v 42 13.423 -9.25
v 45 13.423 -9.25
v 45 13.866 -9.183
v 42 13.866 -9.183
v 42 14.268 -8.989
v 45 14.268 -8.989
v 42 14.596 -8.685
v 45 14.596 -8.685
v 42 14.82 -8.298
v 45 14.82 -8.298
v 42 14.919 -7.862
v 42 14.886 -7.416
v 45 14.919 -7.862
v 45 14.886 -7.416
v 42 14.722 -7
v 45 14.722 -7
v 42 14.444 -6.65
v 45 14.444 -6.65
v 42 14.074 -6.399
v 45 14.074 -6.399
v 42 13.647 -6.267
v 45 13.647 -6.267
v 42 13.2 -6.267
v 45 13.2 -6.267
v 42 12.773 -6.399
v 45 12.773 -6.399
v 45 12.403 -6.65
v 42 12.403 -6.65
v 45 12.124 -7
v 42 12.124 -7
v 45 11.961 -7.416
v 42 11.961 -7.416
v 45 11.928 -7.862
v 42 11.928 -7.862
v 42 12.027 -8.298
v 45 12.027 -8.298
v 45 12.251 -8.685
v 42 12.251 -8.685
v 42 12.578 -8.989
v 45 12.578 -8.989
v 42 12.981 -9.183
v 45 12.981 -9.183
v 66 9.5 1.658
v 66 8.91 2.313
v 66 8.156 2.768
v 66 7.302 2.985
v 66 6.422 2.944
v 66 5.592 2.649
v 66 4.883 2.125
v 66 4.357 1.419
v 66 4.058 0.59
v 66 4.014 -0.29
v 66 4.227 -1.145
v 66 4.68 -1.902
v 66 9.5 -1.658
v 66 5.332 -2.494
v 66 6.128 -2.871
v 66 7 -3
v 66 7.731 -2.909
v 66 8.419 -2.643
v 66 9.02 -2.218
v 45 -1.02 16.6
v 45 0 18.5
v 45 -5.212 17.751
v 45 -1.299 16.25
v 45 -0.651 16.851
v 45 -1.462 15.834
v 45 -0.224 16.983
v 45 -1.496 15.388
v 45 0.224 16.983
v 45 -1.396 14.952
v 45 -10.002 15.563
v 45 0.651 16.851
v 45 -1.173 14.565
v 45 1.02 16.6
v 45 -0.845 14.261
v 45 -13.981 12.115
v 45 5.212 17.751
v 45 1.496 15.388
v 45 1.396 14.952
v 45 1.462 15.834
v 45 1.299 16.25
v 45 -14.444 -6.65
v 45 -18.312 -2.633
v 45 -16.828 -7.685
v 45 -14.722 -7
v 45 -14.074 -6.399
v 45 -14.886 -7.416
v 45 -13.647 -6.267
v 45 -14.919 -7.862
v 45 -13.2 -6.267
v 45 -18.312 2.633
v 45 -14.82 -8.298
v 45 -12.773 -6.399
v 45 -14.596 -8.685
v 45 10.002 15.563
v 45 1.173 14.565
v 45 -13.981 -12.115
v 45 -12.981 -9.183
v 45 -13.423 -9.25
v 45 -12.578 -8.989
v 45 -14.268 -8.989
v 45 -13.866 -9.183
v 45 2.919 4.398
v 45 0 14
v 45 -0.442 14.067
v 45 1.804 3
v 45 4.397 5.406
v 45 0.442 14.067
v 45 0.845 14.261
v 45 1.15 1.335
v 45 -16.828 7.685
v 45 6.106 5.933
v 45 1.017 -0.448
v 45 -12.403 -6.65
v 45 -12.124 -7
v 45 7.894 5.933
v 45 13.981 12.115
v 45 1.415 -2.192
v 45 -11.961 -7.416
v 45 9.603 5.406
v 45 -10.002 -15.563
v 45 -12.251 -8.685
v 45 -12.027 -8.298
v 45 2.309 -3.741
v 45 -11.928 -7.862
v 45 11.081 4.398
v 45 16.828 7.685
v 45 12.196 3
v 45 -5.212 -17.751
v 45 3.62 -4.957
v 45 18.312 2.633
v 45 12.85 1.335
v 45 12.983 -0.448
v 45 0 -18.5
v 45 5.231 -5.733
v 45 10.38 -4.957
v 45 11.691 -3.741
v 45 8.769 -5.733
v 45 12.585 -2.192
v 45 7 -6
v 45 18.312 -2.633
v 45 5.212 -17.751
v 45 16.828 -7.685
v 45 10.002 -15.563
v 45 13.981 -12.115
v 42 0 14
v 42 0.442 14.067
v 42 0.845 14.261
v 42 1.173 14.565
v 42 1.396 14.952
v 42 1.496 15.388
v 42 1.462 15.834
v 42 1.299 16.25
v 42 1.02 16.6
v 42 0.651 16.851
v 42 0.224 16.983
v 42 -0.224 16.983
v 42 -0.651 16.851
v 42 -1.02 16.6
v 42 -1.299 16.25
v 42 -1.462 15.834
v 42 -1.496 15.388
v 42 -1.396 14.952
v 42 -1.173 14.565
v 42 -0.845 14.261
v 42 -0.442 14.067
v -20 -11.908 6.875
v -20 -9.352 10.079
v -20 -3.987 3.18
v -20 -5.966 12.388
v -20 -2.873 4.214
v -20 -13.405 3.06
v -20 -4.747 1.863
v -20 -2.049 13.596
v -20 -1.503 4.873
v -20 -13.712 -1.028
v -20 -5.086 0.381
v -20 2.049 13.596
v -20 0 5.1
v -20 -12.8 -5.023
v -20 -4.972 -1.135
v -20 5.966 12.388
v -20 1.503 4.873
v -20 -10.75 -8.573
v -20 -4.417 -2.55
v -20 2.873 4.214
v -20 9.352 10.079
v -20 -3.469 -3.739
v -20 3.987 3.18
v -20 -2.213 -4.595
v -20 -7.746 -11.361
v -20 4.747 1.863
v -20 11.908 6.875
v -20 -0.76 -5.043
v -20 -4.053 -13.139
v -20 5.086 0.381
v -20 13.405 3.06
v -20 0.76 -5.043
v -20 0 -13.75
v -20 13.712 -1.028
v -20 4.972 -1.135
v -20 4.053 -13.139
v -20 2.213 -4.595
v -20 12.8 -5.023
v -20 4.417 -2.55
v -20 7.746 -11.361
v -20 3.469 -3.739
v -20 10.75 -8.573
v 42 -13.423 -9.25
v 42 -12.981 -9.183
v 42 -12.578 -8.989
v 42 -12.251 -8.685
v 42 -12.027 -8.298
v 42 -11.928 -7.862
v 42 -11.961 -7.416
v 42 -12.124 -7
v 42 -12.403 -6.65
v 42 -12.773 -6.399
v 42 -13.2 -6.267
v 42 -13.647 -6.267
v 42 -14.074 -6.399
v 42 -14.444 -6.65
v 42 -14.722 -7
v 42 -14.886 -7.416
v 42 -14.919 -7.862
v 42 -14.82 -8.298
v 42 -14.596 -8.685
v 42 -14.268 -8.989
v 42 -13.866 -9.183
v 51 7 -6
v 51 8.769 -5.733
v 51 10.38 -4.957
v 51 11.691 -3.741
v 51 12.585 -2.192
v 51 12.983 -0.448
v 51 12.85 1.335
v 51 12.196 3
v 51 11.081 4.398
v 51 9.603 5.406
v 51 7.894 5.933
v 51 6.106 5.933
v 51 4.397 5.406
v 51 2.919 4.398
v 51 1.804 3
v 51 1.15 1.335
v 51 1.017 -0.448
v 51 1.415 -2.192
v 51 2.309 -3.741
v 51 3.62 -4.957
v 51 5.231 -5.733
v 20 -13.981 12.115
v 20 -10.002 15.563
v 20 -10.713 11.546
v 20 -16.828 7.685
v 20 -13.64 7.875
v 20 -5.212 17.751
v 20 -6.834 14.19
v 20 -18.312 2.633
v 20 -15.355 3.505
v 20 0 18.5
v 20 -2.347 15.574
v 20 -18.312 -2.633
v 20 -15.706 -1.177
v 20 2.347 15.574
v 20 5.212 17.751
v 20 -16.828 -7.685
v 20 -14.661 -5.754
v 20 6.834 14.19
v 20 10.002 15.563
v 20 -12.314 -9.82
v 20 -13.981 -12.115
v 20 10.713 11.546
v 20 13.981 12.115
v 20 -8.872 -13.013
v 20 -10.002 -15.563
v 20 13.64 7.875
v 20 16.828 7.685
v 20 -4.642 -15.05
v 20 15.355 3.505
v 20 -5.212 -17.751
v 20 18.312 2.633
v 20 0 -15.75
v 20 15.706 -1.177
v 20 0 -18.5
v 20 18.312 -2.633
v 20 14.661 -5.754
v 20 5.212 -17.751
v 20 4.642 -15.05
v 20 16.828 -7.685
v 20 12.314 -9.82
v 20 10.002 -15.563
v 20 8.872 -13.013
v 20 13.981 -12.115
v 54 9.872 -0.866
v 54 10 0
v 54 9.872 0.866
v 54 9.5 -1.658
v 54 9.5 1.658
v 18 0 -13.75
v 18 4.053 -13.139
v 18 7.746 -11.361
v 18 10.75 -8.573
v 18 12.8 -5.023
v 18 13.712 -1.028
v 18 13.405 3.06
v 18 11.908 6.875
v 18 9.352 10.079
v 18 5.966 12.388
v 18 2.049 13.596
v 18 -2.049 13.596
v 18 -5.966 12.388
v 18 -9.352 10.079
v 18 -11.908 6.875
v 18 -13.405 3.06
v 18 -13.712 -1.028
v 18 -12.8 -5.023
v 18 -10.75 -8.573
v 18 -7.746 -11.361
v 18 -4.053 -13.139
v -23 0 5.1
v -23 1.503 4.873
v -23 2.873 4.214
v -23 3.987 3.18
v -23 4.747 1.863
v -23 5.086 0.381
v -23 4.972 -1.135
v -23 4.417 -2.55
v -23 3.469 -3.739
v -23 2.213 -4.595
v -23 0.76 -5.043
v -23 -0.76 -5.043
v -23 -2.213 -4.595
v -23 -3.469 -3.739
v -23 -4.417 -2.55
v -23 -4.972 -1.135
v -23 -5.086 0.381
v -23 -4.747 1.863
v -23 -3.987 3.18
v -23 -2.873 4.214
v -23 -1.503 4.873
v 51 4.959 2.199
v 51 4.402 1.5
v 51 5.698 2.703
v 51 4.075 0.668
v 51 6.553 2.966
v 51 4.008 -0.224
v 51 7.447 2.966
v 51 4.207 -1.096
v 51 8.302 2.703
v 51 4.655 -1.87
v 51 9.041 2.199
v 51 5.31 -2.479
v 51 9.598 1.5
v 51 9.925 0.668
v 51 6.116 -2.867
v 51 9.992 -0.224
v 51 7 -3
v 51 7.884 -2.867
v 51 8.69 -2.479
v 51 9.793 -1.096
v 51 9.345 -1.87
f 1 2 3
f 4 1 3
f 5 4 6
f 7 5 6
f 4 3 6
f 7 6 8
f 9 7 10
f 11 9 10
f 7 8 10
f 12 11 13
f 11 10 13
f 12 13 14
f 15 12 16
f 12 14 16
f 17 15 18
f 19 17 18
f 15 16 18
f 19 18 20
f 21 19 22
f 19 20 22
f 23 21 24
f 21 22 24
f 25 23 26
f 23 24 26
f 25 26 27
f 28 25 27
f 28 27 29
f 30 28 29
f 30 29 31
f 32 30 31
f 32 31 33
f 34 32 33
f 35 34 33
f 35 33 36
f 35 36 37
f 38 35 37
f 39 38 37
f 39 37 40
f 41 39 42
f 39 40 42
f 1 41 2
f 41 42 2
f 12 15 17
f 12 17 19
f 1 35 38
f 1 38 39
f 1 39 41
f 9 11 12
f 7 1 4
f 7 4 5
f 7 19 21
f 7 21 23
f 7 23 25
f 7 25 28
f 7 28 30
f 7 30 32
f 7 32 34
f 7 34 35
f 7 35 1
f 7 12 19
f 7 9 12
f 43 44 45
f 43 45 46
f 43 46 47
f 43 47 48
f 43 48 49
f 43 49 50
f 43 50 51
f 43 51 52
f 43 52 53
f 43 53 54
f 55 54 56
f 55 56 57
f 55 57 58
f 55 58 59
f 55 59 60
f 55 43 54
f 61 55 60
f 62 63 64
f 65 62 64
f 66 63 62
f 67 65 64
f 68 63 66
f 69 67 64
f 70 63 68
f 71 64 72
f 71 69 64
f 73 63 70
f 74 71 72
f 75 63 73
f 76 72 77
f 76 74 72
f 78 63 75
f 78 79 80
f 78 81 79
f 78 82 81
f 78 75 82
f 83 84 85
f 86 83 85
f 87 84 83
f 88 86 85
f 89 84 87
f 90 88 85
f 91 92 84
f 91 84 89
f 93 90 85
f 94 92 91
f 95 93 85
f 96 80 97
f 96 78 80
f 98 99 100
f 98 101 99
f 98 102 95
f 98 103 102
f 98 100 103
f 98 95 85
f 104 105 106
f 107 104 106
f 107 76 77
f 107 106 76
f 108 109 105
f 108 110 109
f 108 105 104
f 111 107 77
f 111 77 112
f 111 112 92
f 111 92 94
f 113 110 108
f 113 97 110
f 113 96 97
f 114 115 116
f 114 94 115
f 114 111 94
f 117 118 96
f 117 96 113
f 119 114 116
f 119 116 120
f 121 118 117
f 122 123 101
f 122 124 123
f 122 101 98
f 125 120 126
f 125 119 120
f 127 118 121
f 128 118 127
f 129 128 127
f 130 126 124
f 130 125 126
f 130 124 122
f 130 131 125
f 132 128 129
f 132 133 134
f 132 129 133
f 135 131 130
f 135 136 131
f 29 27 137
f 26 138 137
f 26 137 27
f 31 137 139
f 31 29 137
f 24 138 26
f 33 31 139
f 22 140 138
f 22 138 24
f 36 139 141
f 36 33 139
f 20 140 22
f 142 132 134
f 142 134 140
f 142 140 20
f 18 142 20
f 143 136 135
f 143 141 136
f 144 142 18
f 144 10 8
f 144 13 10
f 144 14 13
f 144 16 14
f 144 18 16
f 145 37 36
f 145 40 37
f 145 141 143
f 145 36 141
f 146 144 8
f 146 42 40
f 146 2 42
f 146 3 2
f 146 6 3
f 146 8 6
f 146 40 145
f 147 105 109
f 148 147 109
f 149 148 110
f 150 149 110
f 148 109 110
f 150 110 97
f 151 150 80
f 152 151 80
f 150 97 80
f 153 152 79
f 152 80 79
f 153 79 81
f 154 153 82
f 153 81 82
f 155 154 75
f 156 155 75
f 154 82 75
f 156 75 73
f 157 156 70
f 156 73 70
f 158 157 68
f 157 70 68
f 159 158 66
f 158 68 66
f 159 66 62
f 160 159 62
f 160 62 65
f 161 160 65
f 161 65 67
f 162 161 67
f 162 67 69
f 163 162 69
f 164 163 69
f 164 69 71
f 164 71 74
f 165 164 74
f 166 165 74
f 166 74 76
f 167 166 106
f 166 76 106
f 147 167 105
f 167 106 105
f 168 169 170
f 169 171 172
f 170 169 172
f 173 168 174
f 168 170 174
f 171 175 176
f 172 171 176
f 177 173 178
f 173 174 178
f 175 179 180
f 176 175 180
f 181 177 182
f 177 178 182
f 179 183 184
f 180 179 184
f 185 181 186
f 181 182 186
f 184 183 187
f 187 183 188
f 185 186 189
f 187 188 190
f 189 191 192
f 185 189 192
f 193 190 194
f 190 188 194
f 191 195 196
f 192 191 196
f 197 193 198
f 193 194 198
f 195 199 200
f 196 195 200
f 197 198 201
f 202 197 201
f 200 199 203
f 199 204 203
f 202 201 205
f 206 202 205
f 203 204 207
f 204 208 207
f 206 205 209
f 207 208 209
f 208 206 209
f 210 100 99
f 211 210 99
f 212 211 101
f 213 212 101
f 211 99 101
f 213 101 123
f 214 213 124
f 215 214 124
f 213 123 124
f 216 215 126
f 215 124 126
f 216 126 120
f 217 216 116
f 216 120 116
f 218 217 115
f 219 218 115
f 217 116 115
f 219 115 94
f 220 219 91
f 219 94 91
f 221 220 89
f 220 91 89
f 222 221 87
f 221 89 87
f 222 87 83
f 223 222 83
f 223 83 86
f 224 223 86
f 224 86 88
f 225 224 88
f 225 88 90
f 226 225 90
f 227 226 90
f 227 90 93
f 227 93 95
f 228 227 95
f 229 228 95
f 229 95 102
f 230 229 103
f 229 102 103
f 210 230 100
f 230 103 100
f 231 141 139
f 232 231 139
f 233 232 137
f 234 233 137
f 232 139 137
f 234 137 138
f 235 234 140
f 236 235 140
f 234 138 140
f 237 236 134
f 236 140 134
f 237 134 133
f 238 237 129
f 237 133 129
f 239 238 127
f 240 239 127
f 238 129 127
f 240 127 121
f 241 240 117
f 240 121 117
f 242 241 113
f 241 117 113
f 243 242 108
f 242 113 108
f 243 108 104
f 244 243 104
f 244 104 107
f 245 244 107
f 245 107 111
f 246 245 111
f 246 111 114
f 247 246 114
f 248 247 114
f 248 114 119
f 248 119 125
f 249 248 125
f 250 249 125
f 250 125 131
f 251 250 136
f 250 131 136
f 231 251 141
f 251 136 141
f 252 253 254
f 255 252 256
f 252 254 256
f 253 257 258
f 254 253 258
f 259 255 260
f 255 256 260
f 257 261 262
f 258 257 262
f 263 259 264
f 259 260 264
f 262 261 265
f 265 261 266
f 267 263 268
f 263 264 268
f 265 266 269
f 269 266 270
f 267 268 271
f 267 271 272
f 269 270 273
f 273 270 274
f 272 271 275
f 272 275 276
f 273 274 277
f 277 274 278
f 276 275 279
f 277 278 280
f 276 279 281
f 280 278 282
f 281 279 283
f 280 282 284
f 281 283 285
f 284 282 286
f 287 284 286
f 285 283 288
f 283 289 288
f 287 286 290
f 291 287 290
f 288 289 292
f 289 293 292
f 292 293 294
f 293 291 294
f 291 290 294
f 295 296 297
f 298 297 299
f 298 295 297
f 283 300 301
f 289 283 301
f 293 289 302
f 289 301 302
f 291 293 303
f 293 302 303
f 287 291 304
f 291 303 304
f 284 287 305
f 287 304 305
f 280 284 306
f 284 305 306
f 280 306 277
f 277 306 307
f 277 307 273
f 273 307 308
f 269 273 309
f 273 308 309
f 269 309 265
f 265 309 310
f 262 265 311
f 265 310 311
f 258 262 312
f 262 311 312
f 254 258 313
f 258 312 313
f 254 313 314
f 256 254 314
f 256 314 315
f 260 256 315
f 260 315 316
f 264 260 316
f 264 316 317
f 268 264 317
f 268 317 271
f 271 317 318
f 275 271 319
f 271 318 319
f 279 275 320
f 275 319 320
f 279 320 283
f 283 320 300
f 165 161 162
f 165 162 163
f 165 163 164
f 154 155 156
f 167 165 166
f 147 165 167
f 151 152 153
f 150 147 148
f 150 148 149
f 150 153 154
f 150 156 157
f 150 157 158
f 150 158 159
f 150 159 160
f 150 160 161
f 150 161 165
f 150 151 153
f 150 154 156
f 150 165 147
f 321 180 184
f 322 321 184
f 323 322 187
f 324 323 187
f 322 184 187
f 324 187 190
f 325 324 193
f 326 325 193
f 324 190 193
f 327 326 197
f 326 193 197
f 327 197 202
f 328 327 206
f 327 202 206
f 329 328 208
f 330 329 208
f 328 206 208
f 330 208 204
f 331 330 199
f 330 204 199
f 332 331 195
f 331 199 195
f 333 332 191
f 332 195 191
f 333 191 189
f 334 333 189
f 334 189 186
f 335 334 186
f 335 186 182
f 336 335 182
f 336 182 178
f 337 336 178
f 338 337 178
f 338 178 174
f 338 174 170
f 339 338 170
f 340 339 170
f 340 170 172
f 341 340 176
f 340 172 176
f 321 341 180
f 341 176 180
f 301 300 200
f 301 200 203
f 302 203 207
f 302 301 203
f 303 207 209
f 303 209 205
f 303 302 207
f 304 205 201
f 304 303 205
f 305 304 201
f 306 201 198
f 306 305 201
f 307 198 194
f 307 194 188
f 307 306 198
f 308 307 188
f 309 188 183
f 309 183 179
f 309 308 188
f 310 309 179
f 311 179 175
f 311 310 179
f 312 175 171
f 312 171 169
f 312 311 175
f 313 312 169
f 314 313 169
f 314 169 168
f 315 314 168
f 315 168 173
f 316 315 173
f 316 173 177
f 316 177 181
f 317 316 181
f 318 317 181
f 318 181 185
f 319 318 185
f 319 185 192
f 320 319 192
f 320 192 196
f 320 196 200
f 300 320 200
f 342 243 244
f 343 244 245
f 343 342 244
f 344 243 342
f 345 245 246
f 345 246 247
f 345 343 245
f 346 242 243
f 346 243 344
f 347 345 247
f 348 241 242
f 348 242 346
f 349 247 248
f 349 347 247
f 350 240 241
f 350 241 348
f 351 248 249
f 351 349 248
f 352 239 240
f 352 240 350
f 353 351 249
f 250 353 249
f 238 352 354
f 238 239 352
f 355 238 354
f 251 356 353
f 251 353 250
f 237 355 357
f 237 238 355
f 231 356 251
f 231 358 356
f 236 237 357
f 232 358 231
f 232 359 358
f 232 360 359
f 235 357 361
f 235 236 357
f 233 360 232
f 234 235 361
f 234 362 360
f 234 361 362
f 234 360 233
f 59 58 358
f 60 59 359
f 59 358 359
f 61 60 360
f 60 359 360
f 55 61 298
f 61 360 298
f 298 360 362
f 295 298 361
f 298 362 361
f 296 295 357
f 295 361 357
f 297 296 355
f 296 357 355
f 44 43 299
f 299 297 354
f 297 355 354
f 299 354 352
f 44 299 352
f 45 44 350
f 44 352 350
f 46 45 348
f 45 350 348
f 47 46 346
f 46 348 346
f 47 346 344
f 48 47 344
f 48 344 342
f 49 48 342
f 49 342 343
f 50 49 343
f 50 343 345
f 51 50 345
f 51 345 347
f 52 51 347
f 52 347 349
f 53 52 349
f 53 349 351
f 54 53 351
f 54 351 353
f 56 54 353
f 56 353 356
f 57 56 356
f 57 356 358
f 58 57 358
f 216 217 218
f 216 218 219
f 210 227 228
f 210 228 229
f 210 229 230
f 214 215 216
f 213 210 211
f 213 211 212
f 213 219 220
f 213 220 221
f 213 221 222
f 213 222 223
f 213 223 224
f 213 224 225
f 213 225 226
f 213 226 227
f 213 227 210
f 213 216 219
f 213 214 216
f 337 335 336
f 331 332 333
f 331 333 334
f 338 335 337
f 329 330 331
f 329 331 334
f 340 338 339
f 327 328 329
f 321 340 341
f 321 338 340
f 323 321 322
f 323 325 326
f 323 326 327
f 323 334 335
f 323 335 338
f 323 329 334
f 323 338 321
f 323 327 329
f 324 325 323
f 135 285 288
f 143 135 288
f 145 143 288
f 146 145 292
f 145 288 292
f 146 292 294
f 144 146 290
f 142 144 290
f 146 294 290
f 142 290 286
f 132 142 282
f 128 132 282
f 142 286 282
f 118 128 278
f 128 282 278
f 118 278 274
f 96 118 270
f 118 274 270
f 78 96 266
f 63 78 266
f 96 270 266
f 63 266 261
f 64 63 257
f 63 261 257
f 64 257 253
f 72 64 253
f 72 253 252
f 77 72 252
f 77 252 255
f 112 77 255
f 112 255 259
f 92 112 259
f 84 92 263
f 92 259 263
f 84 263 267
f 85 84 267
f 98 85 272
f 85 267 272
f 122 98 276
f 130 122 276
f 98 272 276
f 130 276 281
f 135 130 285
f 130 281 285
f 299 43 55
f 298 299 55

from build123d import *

# Parameters (mm, degrees)
SKETCH_1_R          = 13.75
EXTRUDE_1_DEPTH     = 20
SKETCH_2_R          = 5.1
EXTRUDE_2_DEPTH     = 3
SKETCH_3_R          = 18.5
EXTRUDE_3_DEPTH     = 25
SKETCH_4_R          = 6
EXTRUDE_4_DEPTH     = 6
SKETCH_5_R          = 3
EXTRUDE_5_DEPTH     = 15
CUT_EXTRUDE_1_DEPTH = 12
SKETCH_7_R          = 1.5
CUT_EXTRUDE_2_DEPTH = 3
CHAMFER_1_SIZE      = 2


with BuildPart() as part:
    # ｽｹｯﾁ1 → ﾎﾞｽ - 押し出し1 (new body, symmetric)
    with BuildSketch(Plane(origin=(0, 0, 0), x_dir=(0, 0, -1), z_dir=(1, 0, 0))):
        Circle(SKETCH_1_R)
    extrude(amount=EXTRUDE_1_DEPTH, both=True)

    # ｽｹｯﾁ2 → ﾎﾞｽ - 押し出し2 (add)
    with BuildSketch(Plane.ZY.offset(20)):
        Circle(SKETCH_2_R)
    extrude(amount=EXTRUDE_2_DEPTH)

    # ｽｹｯﾁ3 → ﾎﾞｽ - 押し出し3 (add)
    with BuildSketch(Plane(origin=(20, 0, 0), x_dir=(0, 0, -1), z_dir=(1, 0, 0))):
        Circle(SKETCH_3_R)
    extrude(amount=EXTRUDE_3_DEPTH)

    # ｽｹｯﾁ4 → ﾎﾞｽ - 押し出し4 (add)
    with BuildSketch(Plane(origin=(45, 0, 0), x_dir=(0, 0, -1), z_dir=(1, 0, 0))):
        with Locations((0, 7)):
            Circle(SKETCH_4_R)
    extrude(amount=EXTRUDE_4_DEPTH)

    # ｽｹｯﾁ5 → ﾎﾞｽ - 押し出し5 (add)
    with BuildSketch(Plane(origin=(51, 0, 0), x_dir=(0, 0, -1), z_dir=(1, 0, 0))):
        with Locations((0, 7)):
            Circle(SKETCH_5_R)
    extrude(amount=EXTRUDE_5_DEPTH)

    # ｽｹｯﾁ6 → ｶｯﾄ - 押し出し1 (cut)
    with BuildSketch(Plane(origin=(66, 0, 0), x_dir=(0, 0, -1), z_dir=(1, 0, 0))):
        Polygon((-80.661429966, 9.5), (-1.658312395, 9.5), (1.658312395, 9.5), (80.661429966, 9.5), (80.661429966, 167.506235142), (-80.661429966, 167.506235142), align=None)
    extrude(amount=-CUT_EXTRUDE_1_DEPTH, mode=Mode.SUBTRACT)

    # ｽｹｯﾁ7 → ｶｯﾄ - 押し出し2 (cut)
    with BuildSketch(Plane(origin=(45, 0, 0), x_dir=(0, 0, -1), z_dir=(1, 0, 0))):
        with Locations((-15.5, 0)):
            Circle(SKETCH_7_R)
        with Locations((7.75, 13.423393759)):
            Circle(SKETCH_7_R)
        with Locations((7.75, -13.423393759)):
            Circle(SKETCH_7_R)
    extrude(amount=-CUT_EXTRUDE_2_DEPTH, mode=Mode.SUBTRACT)

    # 面取り1
    chamfer_1_edges = [part.edges().sort_by_distance(p)[0] for p in [
        (20, 0, 13.75),
    ]]
    chamfer(chamfer_1_edges, length=CHAMFER_1_SIZE)


solid = part.part
